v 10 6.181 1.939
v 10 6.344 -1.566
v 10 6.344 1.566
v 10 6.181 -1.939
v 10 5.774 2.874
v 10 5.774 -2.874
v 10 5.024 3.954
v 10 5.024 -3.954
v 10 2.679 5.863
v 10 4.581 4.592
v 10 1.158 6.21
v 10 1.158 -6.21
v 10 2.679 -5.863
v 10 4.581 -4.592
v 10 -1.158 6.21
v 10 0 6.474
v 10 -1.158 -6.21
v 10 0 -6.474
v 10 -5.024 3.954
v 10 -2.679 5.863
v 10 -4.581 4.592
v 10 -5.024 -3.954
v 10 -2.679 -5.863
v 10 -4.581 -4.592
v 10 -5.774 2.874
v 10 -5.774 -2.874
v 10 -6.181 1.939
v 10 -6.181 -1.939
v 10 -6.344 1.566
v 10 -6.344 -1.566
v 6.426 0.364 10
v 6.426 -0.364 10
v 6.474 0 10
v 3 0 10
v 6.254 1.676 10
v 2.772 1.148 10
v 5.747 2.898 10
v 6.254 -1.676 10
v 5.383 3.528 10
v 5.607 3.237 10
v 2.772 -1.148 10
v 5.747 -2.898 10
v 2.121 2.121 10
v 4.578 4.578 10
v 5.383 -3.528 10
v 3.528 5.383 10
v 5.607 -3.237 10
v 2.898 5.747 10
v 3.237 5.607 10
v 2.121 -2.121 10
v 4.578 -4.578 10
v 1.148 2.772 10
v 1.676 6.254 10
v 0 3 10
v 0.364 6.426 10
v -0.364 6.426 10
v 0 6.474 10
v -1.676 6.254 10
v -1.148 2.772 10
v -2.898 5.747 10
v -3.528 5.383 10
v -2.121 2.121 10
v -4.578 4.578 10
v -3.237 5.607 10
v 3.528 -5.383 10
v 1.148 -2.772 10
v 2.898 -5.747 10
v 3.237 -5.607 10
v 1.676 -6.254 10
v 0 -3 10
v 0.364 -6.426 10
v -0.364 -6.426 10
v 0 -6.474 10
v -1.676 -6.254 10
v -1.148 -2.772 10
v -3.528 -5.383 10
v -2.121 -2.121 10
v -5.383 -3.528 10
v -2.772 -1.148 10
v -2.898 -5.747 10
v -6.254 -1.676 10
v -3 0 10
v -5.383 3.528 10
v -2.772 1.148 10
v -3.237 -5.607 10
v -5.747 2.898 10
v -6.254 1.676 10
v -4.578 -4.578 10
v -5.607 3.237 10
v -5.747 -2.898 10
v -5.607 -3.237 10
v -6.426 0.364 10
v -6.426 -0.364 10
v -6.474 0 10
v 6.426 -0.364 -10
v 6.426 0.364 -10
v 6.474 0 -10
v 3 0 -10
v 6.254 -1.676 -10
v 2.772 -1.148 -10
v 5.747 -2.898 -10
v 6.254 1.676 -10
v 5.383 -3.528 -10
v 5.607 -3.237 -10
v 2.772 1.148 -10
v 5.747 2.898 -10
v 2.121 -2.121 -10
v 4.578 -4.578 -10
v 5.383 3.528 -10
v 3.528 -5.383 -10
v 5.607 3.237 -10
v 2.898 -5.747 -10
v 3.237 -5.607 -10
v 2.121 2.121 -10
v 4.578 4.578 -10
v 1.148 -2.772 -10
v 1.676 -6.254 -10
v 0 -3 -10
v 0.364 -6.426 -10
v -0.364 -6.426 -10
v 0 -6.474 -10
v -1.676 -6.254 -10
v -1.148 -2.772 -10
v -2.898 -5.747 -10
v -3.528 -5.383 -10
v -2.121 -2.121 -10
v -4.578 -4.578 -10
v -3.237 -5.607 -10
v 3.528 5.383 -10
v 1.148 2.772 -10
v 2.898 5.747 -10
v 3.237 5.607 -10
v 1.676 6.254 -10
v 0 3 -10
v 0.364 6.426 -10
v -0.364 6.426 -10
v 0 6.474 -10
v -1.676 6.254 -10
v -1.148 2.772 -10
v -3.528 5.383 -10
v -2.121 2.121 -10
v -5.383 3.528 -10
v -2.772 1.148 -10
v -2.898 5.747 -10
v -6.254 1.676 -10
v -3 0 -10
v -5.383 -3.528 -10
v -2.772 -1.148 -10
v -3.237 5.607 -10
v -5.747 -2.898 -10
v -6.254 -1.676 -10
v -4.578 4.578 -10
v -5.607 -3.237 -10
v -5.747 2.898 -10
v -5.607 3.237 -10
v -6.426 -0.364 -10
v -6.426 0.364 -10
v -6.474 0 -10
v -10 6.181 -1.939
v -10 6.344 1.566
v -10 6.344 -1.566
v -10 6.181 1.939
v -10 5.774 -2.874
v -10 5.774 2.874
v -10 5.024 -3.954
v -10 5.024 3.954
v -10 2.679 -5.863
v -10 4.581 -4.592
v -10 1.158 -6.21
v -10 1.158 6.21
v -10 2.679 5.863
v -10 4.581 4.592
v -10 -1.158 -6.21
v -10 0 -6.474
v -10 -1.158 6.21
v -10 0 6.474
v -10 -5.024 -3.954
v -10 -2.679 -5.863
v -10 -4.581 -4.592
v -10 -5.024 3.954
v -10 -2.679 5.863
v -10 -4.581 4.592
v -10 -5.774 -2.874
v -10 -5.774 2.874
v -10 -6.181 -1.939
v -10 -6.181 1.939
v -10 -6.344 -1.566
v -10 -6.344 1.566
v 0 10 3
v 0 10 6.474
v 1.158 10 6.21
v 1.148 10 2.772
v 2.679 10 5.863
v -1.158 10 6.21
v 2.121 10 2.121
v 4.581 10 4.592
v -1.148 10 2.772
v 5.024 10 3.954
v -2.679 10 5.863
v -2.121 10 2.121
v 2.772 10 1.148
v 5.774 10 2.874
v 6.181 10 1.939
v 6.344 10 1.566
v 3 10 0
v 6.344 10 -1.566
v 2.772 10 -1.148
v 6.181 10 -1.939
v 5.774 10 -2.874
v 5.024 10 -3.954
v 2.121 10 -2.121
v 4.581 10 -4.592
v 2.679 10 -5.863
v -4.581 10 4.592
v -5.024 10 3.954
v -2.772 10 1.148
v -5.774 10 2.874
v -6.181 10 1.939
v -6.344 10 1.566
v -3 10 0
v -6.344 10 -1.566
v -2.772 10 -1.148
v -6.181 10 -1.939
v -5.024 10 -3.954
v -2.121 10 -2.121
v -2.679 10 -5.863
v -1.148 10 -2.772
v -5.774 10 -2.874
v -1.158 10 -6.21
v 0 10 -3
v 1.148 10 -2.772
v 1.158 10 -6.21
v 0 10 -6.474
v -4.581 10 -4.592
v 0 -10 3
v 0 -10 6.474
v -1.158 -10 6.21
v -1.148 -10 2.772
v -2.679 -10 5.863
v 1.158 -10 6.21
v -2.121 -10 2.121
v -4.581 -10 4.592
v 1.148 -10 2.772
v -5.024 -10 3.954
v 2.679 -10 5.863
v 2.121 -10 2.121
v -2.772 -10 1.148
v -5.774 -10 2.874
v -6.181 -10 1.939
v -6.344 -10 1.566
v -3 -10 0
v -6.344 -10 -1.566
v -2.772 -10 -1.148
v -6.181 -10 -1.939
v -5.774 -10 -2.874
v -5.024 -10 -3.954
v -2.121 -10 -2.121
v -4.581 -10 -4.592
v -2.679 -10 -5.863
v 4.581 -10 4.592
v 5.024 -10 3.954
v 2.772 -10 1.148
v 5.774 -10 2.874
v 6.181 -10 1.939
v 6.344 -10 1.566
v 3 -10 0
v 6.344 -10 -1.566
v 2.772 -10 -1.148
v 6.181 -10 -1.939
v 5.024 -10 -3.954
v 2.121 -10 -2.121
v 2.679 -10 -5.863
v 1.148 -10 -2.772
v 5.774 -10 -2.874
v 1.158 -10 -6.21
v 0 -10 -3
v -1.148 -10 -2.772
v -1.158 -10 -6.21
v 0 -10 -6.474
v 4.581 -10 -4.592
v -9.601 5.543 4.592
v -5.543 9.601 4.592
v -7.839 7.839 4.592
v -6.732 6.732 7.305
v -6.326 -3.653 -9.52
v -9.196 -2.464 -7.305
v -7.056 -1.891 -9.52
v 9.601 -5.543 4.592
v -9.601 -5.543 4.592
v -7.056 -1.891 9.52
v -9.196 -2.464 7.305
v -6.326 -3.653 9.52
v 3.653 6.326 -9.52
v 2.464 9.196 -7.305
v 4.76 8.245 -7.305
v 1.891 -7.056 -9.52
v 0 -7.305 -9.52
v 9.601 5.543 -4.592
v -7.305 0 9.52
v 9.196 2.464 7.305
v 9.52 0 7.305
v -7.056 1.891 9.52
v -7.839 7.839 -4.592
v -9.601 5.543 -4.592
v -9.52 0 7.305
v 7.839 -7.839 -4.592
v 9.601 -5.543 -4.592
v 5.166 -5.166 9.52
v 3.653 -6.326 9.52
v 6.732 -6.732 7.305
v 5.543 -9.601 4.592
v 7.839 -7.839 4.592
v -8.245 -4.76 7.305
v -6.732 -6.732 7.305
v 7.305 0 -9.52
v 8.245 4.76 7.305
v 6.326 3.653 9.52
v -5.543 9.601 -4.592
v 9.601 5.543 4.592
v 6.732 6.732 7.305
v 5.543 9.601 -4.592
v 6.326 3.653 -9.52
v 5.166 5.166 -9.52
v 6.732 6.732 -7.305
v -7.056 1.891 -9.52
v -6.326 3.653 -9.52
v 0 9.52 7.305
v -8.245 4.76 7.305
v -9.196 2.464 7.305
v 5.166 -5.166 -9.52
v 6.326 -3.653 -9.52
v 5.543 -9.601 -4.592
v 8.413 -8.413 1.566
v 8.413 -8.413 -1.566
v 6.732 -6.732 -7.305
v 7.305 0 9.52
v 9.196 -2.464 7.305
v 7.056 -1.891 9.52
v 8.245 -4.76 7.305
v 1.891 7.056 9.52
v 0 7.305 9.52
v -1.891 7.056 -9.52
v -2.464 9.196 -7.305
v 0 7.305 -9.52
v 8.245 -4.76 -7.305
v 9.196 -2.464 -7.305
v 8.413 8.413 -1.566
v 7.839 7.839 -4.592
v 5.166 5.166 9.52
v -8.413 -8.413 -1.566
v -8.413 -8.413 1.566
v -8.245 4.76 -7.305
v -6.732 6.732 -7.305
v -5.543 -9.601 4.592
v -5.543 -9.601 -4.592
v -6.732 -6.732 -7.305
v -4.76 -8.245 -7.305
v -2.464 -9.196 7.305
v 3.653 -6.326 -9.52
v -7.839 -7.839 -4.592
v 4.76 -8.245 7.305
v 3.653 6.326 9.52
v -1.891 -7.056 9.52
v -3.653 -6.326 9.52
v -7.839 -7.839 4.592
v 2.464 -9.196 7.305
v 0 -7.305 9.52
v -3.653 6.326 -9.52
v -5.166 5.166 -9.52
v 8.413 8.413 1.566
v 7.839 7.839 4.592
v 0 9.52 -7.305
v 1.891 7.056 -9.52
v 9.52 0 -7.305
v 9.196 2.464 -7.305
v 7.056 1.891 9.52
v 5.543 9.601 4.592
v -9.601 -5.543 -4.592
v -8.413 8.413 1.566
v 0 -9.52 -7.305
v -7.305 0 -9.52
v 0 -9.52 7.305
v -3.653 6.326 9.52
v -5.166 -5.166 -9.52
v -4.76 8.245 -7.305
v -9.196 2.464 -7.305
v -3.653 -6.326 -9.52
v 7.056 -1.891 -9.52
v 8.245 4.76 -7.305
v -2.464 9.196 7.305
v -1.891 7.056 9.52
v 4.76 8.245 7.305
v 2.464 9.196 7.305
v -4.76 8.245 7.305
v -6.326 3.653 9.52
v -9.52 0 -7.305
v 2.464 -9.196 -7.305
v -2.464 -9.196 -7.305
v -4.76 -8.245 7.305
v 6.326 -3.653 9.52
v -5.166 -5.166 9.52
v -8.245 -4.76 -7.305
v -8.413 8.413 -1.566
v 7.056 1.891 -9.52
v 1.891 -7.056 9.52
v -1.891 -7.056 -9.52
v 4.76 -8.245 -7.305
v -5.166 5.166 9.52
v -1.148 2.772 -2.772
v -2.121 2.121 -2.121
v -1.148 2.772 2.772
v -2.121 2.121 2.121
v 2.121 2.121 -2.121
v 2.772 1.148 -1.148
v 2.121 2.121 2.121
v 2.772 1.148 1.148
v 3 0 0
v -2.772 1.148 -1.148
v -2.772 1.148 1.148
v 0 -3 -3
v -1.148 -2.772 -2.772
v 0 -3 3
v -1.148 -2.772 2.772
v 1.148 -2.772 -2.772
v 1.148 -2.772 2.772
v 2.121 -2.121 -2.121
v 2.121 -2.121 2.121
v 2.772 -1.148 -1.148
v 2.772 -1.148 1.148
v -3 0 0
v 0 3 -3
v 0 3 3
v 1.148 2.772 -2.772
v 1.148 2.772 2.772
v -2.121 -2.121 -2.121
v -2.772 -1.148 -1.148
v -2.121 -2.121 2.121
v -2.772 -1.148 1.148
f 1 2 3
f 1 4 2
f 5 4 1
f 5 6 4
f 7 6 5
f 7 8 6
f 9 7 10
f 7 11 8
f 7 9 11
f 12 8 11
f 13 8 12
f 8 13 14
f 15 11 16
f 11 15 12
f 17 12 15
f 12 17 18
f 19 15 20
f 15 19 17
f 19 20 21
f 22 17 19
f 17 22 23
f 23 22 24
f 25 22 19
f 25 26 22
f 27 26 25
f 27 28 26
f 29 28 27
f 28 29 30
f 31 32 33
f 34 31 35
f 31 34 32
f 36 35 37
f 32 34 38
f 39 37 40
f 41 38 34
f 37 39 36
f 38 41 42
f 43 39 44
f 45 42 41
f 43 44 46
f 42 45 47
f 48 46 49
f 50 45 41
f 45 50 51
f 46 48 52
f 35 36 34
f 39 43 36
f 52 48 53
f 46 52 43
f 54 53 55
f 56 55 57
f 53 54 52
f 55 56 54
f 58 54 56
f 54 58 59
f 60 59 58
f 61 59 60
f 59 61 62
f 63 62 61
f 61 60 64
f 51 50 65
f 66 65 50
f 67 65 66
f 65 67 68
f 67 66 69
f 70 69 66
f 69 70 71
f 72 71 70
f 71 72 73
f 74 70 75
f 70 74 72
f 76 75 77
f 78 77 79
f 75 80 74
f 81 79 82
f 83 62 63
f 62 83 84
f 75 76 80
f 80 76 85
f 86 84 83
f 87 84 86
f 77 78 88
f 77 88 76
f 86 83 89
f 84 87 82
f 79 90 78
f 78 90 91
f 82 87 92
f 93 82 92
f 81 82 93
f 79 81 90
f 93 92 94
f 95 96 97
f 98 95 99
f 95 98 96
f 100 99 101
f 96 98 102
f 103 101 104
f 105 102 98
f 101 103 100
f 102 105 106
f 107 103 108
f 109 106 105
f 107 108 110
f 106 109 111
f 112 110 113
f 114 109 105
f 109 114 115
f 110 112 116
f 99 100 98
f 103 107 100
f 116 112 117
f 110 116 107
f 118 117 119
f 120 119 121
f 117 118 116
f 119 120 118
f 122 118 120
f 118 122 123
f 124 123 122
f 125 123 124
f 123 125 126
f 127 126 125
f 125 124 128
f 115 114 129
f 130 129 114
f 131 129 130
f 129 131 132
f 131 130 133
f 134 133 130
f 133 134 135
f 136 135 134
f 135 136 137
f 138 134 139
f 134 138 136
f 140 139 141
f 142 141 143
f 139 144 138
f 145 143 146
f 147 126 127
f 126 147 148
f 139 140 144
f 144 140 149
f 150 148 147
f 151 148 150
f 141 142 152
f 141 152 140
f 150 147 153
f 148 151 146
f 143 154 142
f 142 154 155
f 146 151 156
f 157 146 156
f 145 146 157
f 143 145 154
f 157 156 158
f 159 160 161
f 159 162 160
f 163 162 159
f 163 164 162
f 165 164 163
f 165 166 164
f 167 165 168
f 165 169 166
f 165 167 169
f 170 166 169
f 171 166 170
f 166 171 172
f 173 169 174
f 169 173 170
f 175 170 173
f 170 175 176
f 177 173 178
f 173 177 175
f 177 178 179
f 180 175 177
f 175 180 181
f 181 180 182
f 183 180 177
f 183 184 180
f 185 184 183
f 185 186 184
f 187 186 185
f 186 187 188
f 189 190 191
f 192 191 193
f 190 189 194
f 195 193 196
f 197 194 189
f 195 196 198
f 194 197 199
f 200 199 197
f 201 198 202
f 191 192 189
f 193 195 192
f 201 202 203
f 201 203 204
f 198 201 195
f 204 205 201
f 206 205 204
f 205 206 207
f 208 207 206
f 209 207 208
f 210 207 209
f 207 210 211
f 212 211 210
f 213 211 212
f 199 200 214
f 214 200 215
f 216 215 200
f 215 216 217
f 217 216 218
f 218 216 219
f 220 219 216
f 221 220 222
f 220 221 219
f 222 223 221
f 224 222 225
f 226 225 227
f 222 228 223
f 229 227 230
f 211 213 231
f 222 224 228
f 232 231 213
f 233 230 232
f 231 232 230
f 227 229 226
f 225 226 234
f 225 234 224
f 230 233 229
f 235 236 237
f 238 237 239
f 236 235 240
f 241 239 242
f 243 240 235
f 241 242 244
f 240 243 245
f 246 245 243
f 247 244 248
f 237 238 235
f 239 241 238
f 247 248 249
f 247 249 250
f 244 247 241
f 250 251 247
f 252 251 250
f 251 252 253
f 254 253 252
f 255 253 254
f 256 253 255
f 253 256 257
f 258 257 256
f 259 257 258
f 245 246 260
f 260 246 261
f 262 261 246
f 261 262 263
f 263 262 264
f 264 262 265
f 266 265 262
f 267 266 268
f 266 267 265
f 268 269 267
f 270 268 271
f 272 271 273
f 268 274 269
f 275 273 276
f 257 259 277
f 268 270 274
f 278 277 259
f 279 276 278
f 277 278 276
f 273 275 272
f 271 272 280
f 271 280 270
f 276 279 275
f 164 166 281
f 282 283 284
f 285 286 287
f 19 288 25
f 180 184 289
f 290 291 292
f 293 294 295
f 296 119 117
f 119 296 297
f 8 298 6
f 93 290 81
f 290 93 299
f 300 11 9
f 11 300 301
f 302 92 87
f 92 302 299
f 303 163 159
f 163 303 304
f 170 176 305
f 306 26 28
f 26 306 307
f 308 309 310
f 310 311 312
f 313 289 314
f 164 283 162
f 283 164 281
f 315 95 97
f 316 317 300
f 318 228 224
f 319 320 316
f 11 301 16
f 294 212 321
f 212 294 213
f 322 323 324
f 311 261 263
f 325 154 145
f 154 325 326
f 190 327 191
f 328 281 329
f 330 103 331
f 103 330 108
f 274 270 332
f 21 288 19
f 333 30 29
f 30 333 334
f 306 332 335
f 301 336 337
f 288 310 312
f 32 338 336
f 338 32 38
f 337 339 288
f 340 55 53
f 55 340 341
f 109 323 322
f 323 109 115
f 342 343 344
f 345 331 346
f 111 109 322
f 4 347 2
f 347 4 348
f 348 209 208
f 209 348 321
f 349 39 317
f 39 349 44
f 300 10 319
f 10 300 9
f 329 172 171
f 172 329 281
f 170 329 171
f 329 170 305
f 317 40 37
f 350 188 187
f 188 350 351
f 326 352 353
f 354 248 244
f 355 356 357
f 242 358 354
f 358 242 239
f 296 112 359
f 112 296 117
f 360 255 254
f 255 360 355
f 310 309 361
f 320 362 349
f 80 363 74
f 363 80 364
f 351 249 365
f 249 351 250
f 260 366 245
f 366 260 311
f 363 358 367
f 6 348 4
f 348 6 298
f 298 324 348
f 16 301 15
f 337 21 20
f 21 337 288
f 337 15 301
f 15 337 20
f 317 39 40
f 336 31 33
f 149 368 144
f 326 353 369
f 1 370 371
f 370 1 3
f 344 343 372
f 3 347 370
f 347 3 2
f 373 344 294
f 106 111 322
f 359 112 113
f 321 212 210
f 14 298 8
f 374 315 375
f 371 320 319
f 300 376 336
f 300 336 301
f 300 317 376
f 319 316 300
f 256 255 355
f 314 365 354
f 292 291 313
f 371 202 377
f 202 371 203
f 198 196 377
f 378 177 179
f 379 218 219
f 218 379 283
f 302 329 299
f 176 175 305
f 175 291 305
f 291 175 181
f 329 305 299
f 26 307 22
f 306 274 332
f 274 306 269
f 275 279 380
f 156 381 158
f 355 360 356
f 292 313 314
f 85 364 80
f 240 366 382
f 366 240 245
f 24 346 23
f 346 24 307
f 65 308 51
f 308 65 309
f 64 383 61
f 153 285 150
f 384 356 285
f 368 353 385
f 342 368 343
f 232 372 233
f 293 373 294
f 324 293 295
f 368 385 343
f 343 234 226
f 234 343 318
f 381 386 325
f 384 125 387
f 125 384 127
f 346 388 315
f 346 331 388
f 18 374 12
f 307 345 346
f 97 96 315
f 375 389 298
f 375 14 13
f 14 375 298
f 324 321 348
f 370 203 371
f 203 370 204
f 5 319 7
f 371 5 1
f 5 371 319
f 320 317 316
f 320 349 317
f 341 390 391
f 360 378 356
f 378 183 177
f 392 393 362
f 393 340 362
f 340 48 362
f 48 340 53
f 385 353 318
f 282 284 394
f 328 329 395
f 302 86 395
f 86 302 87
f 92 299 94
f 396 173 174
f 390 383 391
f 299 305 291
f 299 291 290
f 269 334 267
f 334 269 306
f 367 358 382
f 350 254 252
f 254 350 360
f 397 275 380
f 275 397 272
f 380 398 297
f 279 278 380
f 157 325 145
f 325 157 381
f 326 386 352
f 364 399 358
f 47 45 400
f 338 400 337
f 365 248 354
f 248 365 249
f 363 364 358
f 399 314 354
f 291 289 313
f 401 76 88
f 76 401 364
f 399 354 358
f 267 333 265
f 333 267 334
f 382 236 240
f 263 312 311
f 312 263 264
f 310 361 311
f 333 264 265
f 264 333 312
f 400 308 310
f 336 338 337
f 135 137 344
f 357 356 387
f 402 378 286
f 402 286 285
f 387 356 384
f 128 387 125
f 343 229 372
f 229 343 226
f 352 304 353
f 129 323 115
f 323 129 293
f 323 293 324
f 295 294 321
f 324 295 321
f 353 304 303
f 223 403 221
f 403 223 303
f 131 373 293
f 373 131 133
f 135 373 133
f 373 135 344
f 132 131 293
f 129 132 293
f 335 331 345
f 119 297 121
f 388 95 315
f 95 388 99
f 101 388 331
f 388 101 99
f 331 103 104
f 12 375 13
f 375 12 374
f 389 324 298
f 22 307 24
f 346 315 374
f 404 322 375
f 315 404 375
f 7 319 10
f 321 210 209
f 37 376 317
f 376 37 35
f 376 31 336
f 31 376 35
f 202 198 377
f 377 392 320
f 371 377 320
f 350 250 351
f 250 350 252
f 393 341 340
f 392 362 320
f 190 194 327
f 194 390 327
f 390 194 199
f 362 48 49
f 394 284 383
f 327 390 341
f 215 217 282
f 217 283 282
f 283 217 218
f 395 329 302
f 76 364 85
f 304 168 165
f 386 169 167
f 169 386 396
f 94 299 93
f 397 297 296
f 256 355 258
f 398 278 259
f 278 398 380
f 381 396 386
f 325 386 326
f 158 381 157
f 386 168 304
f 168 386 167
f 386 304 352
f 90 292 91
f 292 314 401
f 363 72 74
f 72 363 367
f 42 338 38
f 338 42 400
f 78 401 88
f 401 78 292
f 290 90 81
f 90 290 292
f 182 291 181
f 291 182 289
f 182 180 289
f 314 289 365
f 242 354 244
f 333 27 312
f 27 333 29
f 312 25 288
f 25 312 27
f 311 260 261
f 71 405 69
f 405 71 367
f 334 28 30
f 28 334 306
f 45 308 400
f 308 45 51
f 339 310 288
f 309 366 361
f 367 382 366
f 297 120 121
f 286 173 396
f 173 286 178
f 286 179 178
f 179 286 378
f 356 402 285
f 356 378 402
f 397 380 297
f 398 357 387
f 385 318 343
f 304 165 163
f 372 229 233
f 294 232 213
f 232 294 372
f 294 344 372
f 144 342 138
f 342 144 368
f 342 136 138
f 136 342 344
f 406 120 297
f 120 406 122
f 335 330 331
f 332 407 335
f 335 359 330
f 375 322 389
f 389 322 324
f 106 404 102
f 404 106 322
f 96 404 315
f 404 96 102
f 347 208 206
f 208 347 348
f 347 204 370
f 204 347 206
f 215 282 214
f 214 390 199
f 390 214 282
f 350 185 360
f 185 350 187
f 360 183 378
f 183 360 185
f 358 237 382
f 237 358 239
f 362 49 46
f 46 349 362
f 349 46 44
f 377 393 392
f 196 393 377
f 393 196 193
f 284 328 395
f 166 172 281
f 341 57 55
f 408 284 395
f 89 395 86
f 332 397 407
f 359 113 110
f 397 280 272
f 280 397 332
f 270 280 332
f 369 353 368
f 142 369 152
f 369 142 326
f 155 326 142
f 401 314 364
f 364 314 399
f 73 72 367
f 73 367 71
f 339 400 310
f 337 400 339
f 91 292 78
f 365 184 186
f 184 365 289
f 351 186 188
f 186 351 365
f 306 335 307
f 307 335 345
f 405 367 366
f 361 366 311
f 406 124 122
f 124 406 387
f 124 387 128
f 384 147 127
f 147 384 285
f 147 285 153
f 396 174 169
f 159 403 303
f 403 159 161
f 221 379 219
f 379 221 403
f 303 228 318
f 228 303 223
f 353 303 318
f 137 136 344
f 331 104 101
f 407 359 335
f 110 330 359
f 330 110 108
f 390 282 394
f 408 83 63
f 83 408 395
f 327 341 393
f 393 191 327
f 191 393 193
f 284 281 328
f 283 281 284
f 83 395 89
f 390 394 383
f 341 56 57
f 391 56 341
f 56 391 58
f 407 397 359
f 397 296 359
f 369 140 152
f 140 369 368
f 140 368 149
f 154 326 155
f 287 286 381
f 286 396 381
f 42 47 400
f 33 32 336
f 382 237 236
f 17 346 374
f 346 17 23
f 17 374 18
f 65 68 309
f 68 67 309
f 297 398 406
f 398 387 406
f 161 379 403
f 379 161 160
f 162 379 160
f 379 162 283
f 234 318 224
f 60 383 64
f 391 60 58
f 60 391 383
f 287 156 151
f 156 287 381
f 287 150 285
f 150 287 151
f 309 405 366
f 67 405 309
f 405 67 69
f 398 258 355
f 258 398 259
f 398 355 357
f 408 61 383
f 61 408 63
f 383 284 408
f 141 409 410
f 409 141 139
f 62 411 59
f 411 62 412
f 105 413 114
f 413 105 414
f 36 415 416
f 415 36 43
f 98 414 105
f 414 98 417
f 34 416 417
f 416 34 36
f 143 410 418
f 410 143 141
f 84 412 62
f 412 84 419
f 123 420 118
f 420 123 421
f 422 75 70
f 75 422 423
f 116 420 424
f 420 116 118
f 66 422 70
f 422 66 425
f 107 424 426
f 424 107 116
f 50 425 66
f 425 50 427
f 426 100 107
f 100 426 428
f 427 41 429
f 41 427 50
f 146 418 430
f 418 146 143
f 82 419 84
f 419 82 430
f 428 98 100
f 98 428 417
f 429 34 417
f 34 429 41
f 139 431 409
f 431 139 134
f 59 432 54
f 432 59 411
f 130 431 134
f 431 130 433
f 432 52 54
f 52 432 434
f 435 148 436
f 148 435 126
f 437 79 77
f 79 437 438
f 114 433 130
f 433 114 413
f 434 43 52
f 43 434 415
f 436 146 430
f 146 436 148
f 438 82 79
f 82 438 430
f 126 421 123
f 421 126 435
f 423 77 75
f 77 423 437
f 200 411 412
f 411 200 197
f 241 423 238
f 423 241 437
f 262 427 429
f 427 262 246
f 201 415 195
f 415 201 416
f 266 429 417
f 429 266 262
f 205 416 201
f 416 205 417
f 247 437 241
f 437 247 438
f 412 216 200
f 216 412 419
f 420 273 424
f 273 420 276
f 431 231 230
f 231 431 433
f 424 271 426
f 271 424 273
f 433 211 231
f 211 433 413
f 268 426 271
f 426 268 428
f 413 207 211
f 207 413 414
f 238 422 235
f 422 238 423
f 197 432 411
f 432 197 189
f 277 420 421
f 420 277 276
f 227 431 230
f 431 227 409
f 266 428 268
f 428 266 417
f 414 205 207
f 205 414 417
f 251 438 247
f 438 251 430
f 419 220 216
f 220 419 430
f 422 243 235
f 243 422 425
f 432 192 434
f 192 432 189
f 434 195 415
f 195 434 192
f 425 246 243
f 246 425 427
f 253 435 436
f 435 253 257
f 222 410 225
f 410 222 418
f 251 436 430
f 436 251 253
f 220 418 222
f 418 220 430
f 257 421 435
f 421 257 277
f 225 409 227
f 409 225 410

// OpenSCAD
difference(){intersection(){cube(20,center=true);sphere(12,$fn=24);}union(){cylinder(h=30,r=3,center=true,$fn=16);rotate([90,0,0])cylinder(h=30,r=3,center=true,$fn=16);}}
